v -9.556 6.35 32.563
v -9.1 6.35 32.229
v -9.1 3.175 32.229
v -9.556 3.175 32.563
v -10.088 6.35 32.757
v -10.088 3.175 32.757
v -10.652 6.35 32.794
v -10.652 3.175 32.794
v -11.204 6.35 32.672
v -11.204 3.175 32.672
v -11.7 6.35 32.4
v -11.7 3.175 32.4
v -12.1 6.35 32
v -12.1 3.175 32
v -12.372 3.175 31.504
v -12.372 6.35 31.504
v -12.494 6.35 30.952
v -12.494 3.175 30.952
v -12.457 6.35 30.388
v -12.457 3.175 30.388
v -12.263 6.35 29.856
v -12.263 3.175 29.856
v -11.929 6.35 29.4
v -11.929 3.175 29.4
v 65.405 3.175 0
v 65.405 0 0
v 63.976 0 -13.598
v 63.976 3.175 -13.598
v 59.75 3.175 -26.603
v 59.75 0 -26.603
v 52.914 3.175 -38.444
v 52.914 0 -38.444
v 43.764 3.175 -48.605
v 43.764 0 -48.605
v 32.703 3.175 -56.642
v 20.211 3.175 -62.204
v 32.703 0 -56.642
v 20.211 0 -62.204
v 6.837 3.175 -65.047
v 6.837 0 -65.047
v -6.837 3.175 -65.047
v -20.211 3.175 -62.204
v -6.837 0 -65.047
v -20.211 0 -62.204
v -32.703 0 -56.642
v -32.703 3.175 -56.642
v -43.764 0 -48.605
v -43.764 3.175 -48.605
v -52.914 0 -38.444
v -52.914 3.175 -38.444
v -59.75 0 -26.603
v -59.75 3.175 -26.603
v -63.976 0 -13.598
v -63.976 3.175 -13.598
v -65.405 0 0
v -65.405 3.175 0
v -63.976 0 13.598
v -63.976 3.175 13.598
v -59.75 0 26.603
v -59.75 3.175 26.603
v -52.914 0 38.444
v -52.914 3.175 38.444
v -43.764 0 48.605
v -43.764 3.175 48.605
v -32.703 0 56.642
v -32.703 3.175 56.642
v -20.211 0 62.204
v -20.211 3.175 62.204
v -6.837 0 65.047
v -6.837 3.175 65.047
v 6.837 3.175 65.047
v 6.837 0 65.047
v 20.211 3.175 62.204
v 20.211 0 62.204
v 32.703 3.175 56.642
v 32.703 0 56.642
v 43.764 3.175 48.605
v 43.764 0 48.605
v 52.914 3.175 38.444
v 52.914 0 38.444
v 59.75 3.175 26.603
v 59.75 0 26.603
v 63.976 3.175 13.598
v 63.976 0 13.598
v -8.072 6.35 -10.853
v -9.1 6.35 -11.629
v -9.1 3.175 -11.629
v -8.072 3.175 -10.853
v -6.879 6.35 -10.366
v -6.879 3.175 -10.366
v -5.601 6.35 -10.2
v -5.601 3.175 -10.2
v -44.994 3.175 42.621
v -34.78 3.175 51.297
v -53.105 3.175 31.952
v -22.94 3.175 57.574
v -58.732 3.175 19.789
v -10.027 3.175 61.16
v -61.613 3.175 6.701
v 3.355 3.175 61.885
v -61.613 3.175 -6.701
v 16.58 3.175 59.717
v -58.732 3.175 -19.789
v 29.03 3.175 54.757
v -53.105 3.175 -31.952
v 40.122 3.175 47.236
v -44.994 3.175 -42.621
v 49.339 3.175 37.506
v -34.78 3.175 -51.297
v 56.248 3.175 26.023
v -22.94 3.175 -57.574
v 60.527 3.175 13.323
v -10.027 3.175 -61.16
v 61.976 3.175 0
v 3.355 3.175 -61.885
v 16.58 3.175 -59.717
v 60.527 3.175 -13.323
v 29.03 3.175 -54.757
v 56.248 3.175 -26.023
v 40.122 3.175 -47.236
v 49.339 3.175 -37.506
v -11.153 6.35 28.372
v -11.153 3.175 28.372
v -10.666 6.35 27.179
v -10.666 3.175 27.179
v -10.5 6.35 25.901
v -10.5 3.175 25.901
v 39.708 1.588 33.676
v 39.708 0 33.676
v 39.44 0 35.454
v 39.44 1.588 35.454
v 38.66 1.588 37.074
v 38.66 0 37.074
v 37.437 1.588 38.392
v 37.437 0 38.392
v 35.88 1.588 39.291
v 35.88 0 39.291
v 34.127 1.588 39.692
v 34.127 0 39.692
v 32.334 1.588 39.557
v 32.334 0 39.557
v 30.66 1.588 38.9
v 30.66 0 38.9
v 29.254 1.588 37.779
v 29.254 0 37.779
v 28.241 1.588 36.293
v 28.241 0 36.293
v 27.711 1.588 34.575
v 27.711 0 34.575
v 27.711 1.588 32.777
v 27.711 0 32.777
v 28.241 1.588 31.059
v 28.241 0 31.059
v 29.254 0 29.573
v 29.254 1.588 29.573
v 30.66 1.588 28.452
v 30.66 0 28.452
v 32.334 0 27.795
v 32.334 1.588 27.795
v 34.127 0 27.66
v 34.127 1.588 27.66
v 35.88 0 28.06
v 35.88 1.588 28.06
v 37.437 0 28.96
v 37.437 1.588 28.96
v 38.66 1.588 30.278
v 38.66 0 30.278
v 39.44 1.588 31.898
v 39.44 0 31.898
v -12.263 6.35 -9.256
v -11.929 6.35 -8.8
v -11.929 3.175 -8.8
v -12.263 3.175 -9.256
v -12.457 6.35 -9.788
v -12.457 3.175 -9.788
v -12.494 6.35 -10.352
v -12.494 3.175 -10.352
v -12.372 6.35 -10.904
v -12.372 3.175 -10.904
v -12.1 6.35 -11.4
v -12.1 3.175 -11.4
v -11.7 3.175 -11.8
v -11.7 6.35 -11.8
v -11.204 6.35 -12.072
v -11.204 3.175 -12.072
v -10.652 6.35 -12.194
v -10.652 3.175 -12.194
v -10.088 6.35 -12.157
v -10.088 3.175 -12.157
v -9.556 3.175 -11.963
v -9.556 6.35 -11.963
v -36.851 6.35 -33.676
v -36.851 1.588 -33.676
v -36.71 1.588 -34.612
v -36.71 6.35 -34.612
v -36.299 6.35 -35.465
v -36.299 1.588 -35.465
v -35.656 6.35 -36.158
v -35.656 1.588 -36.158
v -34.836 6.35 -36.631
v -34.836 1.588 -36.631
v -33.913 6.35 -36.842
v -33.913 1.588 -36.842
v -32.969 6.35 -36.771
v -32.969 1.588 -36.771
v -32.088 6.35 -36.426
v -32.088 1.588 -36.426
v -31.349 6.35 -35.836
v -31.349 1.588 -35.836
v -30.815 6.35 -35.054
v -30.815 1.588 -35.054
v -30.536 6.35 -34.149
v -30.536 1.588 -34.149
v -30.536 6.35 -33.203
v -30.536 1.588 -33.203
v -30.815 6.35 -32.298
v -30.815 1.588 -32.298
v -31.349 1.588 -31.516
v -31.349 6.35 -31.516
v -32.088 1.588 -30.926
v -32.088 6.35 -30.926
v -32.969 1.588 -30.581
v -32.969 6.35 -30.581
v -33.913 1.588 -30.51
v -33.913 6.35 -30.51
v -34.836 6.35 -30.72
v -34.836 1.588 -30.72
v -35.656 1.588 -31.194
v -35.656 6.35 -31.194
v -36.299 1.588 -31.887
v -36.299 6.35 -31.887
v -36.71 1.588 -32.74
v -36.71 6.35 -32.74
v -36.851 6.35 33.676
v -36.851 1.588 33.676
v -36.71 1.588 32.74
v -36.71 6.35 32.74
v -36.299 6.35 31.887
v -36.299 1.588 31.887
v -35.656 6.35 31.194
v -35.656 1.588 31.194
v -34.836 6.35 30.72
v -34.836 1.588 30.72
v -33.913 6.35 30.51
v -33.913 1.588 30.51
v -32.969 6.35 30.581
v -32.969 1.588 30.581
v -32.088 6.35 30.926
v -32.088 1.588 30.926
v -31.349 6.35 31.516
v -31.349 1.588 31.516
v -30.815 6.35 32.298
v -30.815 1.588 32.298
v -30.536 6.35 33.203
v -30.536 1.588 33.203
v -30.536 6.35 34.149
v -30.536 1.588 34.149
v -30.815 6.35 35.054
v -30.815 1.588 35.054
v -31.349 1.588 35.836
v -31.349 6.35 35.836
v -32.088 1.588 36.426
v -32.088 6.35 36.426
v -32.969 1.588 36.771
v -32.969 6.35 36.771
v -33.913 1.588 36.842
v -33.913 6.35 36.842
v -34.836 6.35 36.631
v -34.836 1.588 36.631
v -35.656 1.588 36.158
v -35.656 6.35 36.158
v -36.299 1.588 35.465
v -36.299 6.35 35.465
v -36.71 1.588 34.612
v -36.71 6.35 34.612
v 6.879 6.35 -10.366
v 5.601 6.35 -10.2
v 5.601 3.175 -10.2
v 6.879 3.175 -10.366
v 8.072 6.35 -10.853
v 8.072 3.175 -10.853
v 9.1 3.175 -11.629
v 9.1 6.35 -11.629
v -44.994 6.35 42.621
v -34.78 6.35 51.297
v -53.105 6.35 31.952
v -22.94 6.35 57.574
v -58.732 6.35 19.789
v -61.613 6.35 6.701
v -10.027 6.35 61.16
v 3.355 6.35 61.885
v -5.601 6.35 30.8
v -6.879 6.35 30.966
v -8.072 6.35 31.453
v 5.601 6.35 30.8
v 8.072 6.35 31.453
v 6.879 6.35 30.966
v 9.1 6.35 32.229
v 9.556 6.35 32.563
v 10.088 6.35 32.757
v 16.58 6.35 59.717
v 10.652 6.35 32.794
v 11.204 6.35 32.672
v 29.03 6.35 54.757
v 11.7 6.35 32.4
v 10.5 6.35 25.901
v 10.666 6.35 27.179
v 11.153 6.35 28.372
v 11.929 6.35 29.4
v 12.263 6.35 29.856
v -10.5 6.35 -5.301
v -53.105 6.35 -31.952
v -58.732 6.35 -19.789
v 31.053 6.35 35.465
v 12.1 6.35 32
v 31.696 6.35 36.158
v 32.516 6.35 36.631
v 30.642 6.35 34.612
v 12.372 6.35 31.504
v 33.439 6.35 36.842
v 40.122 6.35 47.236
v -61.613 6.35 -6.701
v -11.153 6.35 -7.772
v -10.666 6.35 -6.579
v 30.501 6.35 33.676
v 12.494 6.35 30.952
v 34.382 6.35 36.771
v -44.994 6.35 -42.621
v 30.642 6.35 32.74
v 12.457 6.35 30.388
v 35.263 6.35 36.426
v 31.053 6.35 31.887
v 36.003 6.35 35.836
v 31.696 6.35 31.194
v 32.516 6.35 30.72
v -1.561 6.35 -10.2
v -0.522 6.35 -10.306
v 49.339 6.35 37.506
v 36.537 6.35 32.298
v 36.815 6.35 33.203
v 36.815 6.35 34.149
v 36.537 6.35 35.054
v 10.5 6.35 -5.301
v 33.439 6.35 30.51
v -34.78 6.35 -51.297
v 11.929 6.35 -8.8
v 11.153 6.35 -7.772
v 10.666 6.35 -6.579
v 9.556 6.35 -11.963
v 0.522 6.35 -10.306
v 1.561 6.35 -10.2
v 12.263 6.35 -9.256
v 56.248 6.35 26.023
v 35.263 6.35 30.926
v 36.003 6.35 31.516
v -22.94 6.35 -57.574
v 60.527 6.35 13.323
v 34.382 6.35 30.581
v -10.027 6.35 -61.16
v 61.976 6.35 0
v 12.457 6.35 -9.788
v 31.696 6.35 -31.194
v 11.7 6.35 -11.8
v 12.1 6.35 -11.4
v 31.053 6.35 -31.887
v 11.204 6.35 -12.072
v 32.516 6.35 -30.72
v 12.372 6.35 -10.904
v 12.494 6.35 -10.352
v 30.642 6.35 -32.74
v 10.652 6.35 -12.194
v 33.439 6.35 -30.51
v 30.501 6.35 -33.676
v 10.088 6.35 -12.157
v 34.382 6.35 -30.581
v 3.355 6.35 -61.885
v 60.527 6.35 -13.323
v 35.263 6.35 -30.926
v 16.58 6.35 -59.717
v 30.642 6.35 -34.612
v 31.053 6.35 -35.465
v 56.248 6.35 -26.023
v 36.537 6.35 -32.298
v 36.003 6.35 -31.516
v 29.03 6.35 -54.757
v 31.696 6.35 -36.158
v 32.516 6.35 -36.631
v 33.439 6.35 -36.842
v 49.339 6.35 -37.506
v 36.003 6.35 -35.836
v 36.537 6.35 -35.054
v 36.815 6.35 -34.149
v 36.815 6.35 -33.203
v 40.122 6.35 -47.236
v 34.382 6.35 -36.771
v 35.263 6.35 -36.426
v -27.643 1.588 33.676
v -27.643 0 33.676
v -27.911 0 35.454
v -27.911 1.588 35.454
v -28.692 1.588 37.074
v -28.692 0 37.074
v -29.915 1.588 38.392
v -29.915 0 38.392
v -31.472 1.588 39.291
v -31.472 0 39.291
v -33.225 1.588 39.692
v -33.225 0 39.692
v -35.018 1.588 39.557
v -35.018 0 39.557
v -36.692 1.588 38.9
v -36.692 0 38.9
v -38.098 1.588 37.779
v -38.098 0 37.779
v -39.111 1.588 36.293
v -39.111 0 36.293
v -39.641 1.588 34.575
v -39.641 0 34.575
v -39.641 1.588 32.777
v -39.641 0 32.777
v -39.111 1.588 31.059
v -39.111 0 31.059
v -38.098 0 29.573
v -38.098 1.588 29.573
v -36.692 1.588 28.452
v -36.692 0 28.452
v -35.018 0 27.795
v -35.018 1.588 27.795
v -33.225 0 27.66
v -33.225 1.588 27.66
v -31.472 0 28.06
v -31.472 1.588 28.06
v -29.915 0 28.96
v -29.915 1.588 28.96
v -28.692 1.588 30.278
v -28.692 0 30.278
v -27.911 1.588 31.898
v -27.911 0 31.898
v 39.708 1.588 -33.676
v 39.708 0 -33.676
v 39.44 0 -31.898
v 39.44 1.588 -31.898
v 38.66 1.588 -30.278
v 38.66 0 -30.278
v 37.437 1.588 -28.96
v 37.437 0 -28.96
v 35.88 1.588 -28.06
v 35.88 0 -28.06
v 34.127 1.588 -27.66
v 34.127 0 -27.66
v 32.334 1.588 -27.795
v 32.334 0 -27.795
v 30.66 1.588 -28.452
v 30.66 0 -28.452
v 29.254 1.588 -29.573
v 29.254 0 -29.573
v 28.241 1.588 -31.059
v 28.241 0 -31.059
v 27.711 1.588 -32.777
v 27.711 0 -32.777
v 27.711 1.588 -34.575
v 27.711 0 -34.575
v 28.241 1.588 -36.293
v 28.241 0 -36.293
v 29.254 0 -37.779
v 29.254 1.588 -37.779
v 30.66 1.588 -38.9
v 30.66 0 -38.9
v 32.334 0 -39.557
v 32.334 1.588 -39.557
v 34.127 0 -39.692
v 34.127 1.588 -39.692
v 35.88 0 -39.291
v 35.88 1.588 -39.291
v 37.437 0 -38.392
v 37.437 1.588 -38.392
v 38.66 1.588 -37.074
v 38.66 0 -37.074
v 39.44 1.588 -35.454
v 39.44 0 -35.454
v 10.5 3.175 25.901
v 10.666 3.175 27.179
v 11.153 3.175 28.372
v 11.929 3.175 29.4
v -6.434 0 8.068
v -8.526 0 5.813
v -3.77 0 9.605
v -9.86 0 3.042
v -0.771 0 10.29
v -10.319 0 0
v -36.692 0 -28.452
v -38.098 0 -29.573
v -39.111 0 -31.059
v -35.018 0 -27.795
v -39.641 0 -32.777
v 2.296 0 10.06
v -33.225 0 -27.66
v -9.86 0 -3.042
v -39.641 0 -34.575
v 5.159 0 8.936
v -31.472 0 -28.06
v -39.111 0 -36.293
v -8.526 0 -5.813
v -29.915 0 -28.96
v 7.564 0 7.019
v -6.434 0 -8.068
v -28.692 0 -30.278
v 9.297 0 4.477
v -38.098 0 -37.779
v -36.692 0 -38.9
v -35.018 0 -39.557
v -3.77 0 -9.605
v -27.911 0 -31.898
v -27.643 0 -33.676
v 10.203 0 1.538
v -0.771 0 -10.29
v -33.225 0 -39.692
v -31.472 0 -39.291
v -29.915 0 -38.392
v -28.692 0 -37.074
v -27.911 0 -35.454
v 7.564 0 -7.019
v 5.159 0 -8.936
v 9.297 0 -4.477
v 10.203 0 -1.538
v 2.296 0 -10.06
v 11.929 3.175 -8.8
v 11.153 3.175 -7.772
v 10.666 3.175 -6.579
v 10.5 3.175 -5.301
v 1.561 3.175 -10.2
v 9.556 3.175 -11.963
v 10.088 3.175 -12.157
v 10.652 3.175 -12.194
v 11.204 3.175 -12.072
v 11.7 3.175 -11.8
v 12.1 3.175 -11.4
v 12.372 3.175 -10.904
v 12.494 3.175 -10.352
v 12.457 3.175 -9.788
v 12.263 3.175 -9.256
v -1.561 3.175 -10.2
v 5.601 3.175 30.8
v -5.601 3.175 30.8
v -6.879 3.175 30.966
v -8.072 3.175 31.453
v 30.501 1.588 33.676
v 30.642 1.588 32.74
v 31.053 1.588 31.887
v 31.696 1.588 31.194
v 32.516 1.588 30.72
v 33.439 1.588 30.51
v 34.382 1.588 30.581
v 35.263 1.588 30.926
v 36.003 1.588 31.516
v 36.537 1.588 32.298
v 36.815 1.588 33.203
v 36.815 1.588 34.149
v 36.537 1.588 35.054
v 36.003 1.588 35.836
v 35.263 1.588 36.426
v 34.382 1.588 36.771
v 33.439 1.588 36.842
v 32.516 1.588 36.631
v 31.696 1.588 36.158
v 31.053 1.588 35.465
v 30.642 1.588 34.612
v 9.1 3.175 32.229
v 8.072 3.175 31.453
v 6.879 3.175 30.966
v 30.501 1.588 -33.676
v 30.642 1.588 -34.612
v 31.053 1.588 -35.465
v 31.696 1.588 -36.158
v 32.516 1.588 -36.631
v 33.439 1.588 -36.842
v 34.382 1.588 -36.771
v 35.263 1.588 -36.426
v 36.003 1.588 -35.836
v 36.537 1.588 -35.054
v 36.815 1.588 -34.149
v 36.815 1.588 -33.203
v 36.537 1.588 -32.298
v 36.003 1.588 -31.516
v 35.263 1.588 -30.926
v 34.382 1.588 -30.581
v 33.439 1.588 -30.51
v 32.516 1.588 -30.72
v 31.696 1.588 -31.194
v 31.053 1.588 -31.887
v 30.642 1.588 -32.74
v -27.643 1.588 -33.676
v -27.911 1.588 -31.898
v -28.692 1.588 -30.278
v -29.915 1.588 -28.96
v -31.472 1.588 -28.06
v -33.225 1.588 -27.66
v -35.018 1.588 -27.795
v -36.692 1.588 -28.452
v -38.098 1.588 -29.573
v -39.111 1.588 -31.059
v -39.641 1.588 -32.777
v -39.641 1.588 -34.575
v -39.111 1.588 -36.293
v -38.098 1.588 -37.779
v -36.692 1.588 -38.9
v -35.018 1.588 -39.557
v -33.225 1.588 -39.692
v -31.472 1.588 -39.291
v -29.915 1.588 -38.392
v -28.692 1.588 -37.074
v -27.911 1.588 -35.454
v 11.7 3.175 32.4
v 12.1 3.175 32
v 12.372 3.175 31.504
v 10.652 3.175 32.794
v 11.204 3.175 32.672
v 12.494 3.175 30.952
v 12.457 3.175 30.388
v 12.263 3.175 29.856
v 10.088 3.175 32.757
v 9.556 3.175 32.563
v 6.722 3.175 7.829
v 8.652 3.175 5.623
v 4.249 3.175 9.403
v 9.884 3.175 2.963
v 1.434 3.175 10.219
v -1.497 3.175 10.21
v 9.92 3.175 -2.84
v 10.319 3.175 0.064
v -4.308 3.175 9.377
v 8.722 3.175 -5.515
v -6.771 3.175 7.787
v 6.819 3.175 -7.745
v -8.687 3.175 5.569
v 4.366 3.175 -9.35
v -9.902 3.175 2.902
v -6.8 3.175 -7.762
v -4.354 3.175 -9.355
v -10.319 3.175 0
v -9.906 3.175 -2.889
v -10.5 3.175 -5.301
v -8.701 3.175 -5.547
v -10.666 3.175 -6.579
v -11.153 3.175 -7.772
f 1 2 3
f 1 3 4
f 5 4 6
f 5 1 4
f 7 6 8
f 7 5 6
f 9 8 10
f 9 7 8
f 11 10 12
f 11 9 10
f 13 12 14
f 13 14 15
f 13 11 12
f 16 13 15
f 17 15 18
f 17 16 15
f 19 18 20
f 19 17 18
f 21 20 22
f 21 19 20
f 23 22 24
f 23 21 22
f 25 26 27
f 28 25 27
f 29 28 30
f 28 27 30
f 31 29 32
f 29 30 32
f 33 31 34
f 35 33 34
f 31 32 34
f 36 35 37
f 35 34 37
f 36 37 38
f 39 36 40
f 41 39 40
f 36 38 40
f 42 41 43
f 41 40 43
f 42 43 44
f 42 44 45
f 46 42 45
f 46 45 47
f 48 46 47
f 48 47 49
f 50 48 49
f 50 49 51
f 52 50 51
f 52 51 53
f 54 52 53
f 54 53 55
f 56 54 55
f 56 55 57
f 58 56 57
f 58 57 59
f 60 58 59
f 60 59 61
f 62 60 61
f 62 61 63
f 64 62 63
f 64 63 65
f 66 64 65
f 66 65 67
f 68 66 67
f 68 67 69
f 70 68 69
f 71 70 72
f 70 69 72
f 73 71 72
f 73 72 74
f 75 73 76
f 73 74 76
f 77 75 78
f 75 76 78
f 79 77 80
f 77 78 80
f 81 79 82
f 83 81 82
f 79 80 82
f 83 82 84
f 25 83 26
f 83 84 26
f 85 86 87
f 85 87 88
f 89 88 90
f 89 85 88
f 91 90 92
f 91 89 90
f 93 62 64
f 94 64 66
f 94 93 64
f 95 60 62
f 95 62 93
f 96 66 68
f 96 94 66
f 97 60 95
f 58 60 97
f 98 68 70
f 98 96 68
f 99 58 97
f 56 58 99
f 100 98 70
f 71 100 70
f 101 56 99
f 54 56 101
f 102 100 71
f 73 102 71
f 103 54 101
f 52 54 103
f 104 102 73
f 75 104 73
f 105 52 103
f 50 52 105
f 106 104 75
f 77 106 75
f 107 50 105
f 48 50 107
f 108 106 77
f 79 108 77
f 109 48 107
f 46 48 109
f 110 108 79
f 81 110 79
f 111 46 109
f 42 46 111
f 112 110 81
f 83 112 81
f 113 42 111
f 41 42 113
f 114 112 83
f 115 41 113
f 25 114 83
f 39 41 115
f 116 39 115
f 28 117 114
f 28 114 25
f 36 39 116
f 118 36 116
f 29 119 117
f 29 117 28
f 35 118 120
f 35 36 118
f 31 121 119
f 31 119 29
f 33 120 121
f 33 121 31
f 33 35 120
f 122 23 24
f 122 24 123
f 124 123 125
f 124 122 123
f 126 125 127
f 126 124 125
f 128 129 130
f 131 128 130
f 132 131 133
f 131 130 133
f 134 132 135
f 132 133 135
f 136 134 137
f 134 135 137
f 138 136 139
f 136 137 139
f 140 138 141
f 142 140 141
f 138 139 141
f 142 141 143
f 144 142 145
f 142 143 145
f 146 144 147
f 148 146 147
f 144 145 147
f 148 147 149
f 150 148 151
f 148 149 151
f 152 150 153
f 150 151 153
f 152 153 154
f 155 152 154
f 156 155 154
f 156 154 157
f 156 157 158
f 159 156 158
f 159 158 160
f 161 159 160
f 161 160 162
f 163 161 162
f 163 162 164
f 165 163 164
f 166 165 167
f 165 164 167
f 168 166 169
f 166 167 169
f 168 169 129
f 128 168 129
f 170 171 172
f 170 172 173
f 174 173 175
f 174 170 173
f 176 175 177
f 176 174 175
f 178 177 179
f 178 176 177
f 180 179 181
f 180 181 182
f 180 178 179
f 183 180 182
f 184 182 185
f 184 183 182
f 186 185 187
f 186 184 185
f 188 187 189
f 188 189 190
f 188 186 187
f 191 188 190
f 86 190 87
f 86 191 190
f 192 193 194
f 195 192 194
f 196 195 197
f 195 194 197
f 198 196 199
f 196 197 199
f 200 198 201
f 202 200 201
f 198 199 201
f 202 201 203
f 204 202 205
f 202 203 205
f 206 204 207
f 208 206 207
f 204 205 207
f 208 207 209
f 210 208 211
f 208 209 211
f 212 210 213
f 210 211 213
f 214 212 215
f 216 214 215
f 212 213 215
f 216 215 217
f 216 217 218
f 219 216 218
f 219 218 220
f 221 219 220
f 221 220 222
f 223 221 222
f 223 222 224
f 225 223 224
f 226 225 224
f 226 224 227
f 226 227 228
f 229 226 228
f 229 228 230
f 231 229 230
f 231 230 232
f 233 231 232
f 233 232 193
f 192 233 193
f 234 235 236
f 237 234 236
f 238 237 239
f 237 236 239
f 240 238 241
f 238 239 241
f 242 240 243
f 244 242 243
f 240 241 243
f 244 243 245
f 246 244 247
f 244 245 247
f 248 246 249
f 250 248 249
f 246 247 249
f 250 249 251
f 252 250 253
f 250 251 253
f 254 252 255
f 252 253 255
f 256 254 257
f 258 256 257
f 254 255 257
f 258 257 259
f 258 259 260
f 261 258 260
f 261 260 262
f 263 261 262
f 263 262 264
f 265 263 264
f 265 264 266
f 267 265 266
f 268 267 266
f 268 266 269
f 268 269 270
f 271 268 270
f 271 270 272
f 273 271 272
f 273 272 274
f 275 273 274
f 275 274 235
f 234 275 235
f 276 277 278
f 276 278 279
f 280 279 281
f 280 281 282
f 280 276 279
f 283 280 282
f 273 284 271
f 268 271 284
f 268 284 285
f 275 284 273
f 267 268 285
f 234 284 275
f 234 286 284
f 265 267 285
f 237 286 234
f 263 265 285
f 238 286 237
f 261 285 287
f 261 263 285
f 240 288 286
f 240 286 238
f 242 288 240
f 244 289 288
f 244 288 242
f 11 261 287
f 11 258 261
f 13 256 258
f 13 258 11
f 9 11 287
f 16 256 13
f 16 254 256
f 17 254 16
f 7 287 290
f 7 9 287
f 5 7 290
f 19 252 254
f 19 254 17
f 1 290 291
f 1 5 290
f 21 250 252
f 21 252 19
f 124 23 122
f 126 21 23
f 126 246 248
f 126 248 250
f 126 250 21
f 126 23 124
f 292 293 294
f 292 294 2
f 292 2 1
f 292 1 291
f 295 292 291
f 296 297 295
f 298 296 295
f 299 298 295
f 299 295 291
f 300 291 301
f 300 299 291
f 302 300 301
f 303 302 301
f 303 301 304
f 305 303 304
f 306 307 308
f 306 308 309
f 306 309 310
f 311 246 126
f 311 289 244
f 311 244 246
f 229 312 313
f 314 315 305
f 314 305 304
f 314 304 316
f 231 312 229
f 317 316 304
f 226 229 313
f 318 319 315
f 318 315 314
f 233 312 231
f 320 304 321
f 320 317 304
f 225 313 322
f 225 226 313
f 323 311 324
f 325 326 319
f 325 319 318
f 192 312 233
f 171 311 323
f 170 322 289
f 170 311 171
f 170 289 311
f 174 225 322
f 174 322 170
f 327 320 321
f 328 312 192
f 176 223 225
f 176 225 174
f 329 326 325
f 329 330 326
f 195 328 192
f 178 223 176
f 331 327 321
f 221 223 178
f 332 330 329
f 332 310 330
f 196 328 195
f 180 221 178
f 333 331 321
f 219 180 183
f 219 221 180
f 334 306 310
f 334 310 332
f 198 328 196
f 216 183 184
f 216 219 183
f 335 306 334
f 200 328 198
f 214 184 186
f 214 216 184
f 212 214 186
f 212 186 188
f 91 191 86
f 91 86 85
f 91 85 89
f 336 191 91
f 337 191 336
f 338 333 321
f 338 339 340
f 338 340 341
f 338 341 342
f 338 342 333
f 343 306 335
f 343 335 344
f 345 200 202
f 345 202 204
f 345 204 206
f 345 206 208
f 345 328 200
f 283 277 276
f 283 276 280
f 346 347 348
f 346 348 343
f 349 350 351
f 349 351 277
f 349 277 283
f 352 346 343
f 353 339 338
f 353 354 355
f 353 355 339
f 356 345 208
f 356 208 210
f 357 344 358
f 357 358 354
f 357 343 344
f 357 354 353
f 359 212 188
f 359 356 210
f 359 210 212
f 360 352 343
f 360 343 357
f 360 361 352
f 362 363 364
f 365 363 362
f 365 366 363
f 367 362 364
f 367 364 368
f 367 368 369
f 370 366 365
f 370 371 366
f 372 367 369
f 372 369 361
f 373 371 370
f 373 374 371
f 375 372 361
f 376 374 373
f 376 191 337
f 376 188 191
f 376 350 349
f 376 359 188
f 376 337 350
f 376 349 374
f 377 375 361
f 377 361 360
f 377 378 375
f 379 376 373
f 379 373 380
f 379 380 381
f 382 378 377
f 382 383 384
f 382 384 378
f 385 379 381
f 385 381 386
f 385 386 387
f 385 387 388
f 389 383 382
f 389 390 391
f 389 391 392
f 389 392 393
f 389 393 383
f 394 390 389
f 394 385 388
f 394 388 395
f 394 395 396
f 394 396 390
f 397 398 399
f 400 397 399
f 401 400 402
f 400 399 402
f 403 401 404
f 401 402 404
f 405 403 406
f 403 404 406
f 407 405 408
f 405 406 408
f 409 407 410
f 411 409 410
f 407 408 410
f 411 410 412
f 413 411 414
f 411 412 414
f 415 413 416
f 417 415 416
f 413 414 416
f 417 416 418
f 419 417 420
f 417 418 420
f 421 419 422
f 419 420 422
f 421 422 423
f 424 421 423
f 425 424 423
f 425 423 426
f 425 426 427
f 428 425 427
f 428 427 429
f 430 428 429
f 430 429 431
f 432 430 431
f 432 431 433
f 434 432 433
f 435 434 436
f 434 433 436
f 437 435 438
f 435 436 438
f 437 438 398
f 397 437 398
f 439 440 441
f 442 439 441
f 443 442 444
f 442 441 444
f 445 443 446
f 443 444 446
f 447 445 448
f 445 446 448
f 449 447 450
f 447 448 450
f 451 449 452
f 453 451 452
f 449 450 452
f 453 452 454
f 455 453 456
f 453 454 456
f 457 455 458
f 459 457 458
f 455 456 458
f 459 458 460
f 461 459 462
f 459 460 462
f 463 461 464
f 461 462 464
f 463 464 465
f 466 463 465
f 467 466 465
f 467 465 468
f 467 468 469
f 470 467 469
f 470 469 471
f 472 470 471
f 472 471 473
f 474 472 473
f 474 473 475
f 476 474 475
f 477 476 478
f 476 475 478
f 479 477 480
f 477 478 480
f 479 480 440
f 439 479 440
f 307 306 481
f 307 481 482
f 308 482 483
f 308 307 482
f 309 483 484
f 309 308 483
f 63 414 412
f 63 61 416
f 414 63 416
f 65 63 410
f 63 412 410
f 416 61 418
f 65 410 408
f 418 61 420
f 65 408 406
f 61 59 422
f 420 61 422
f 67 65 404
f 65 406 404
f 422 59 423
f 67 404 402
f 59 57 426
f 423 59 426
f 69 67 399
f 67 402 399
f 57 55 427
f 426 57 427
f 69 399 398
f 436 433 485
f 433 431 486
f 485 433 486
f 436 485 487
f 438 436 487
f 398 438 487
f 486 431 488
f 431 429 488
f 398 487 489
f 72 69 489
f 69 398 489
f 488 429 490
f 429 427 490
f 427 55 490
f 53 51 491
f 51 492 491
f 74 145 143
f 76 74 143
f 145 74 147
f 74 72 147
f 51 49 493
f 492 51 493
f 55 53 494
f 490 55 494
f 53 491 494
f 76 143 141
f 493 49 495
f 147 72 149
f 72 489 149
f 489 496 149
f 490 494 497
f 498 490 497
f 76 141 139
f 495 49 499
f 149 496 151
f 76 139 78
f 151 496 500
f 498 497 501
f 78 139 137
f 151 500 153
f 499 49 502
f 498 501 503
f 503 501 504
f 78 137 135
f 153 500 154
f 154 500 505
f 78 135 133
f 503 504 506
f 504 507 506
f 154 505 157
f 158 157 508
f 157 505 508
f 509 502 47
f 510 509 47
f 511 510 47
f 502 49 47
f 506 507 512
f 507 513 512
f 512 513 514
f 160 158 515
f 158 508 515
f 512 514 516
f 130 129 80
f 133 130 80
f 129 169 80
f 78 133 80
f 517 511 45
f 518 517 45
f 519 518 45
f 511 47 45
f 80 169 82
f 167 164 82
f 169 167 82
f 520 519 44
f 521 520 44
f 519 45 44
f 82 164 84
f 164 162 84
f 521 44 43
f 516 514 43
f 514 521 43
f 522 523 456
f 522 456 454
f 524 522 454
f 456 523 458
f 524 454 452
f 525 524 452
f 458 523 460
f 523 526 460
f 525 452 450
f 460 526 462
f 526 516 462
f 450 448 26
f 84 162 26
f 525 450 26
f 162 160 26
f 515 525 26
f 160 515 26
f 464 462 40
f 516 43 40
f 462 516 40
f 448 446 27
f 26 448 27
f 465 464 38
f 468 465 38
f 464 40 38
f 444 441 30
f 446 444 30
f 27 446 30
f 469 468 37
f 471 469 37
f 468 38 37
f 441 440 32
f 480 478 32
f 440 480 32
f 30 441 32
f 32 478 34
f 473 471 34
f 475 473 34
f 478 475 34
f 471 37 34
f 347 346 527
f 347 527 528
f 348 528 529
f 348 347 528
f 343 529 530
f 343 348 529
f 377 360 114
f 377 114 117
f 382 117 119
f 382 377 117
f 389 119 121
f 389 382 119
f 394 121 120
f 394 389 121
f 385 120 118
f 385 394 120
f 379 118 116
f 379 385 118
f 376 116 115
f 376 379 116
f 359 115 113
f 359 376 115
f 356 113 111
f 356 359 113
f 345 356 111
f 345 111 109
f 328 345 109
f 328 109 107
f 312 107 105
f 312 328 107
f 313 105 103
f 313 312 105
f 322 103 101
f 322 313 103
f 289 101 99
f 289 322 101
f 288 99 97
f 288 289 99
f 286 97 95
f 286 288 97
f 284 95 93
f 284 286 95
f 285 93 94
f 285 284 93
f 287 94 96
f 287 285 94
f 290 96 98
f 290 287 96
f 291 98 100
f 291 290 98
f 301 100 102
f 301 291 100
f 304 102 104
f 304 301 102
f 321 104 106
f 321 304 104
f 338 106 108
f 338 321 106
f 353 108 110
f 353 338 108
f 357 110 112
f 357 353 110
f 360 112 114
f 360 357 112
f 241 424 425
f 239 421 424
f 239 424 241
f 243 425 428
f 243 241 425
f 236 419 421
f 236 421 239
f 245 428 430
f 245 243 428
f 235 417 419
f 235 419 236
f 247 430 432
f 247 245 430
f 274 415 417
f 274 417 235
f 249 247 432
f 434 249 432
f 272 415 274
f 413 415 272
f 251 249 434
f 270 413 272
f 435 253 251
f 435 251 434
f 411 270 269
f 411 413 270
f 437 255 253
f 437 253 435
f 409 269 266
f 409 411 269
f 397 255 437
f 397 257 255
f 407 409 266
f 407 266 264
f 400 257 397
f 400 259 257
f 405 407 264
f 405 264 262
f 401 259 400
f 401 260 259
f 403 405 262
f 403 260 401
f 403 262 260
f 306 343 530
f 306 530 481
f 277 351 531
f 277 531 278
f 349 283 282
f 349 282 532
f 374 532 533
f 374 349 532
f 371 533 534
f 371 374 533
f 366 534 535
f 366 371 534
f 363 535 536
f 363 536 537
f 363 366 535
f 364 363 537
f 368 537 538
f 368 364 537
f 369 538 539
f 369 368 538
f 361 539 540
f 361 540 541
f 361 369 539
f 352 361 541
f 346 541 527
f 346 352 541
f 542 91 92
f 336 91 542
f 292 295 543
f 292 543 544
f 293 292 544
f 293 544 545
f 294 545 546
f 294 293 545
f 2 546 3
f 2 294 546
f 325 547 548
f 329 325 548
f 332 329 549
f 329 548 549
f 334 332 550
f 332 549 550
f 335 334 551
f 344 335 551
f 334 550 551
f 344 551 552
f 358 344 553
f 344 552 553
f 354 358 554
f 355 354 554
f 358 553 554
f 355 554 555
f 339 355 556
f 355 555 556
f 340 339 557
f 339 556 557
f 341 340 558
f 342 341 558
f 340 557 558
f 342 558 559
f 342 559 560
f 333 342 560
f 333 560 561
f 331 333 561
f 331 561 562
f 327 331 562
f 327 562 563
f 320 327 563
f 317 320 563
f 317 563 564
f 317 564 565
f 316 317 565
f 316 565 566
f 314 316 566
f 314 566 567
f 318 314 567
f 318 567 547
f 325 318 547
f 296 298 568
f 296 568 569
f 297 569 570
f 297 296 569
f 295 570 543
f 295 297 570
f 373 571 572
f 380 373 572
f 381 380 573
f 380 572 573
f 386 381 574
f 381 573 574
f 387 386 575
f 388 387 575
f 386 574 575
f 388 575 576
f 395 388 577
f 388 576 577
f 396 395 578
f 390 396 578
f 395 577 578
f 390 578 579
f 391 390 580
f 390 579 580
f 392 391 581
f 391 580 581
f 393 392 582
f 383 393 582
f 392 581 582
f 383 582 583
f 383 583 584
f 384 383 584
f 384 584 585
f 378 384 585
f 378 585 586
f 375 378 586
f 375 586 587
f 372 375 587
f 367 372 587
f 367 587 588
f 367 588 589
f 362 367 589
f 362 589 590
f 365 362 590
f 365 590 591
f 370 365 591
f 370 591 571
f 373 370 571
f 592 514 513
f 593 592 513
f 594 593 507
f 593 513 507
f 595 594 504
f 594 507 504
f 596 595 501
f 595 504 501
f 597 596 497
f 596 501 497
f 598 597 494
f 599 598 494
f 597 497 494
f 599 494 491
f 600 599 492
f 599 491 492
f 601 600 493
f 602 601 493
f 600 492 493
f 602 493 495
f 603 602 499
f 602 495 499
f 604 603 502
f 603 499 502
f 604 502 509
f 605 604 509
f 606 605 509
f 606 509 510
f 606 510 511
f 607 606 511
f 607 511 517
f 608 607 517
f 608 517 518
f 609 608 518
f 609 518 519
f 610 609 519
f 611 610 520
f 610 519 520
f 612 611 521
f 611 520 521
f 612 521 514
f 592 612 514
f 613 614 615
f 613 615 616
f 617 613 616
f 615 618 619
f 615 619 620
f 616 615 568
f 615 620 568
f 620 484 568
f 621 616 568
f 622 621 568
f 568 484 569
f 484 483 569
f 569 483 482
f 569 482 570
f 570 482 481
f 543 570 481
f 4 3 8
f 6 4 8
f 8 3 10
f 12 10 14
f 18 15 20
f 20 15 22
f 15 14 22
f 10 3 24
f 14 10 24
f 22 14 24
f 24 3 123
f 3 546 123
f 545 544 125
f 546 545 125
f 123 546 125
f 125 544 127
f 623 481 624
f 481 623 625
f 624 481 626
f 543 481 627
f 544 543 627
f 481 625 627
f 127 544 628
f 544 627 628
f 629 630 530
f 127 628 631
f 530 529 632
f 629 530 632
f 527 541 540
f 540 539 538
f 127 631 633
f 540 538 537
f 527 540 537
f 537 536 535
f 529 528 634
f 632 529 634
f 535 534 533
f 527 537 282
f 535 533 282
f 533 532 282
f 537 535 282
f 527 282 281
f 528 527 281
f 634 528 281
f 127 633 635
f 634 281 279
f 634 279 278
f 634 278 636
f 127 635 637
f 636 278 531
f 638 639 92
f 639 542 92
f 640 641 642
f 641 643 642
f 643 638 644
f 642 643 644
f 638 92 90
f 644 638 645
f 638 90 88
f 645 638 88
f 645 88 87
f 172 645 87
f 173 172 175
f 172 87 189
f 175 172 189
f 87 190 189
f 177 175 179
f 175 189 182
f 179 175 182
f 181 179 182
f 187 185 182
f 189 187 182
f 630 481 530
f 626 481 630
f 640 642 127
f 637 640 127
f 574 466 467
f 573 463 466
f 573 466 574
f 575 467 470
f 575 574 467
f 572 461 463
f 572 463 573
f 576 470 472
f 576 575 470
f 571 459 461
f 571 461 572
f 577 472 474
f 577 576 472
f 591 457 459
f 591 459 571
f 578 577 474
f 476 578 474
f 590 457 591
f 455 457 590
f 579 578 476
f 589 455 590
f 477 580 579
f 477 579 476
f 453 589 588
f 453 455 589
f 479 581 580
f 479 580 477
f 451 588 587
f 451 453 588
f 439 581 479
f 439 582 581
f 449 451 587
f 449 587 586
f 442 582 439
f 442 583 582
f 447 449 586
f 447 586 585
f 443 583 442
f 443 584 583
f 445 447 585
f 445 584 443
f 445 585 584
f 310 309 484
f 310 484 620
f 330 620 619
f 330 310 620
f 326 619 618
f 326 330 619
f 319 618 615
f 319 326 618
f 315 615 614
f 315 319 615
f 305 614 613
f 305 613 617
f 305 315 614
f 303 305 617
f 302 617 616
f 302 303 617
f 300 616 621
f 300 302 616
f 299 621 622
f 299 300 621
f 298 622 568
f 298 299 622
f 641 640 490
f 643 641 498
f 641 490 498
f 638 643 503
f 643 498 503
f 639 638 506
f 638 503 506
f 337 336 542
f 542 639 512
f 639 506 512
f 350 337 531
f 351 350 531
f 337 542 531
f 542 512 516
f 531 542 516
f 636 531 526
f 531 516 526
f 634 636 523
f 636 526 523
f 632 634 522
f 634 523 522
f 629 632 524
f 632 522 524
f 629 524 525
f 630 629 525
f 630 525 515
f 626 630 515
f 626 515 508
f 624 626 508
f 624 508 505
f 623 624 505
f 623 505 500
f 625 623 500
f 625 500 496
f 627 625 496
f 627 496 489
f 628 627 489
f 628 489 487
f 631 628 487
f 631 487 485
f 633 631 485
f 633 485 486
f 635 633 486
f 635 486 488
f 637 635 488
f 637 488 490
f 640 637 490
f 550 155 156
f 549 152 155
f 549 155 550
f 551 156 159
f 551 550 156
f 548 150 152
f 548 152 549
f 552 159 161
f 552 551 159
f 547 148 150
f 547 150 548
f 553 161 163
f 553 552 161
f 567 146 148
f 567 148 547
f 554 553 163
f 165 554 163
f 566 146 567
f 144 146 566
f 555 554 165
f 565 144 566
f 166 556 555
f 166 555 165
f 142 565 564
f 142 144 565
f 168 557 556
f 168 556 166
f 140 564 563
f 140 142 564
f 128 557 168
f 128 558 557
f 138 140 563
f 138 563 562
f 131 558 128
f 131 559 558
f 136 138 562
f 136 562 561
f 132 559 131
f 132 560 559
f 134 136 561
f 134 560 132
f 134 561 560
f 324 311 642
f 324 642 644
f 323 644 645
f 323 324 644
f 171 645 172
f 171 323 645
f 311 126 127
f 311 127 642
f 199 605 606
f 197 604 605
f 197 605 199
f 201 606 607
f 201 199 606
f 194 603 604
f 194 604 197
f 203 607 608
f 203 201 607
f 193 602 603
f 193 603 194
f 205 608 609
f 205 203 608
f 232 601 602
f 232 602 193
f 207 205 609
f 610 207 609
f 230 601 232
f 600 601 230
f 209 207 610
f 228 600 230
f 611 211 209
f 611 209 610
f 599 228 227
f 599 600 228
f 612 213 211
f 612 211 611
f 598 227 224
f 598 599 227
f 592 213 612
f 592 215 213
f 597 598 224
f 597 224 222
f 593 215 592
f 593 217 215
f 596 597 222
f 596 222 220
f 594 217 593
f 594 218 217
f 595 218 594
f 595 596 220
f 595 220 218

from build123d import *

# Parameters (mm, degrees)
SKETCH2_R                       = 65.405
BOSS_EXTRUDE1_DEPTH             = 6.35
SKETCH4_R                       = 65.405
SKETCH4_R_2                     = 61.976
CUT_EXTRUDE1_DEPTH              = 3.175
F_1_4_0_25_DIAMETER_HOLE1_D     = 6.35
F_13_16_0_8125_DIAMETER_HOLE1_D = 20.6375
CUT_EXTRUDE3_DEPTH              = 3.175
SKETCH9_R                       = 6.0325
CUT_EXTRUDE2_DEPTH              = 1.5875


with BuildPart() as part:
    # Sketch2 → Boss-Extrude1 (new body)
    with BuildSketch(Plane(origin=(0, 0, 0), x_dir=(1, 0, 0), z_dir=(0, 1, 0))):
        Circle(SKETCH2_R)
    extrude(amount=BOSS_EXTRUDE1_DEPTH)

    # Sketch4 → Cut-Extrude1 (cut)
    with BuildSketch(Plane(origin=(0, 6.35, 0), x_dir=(1, 0, 0), z_dir=(0, 1, 0))):
        Circle(SKETCH4_R)
        Circle(SKETCH4_R_2, mode=Mode.SUBTRACT)
    extrude(amount=-CUT_EXTRUDE1_DEPTH, mode=Mode.SUBTRACT)

    # 1/4 (0.25) Diameter Hole1 (through all)
    with Locations(Plane(origin=(0, 6.35, 0), x_dir=(1, 0, 0), z_dir=(0, 1, 0))):
        with Locations((-33.675960454, 33.675960454), (-33.675960454, -33.675960454), (33.675960454, 33.675960454), (33.675960454, -33.675960454)):
            Hole(F_1_4_0_25_DIAMETER_HOLE1_D / 2)

    # 13/16 (0.8125) Diameter Hole1 (through all)
    with Locations(Plane(origin=(0, 6.35, 0), x_dir=(1, 0, 0), z_dir=(0, 1, 0))):
        with Locations((0, 0)):
            Hole(F_13_16_0_8125_DIAMETER_HOLE1_D / 2)

    # Sketch11 → Cut-Extrude3 (cut)
    with BuildSketch(Plane(origin=(0, 6.35, 0), x_dir=(1, 0, 0), z_dir=(0, 1, 0))):
        with BuildLine():
            Line((-5.601020514, 10.2), (5.601020514, 10.2))
            ThreePointArc((5.601020514, 10.2), (7.490842879, 10.570899501), (9.100291576, 11.628571429))
            ThreePointArc((9.100291576, 11.628571429), (11.914213562, 11.614213562), (11.928571429, 8.800291576))
            ThreePointArc((11.928571429, 8.800291576), (10.870899501, 7.190842879), (10.5, 5.301020514))
            Line((10.5, 5.301020514), (10.5, -25.901020514))
            ThreePointArc((10.5, -25.901020514), (10.870899501, -27.790842879), (11.928571429, -29.400291576))
            ThreePointArc((11.928571429, -29.400291576), (11.914213562, -32.214213562), (9.100291576, -32.228571429))
            ThreePointArc((9.100291576, -32.228571429), (7.490842879, -31.170899501), (5.601020514, -30.8))
            Line((5.601020514, -30.8), (-5.601020514, -30.8))
            ThreePointArc((-5.601020514, -30.8), (-7.490842879, -31.170899501), (-9.100291576, -32.228571429))
            ThreePointArc((-9.100291576, -32.228571429), (-11.914213562, -32.214213562), (-11.928571429, -29.400291576))
            ThreePointArc((-11.928571429, -29.400291576), (-10.870899501, -27.790842879), (-10.5, -25.901020514))
            Line((-10.5, -25.901020514), (-10.5, 5.301020514))
            ThreePointArc((-10.5, 5.301020514), (-10.870899501, 7.190842879), (-11.928571429, 8.800291576))
            ThreePointArc((-11.928571429, 8.800291576), (-11.914213562, 11.614213562), (-9.100291576, 11.628571429))
            ThreePointArc((-9.100291576, 11.628571429), (-7.490842879, 10.570899501), (-5.601020514, 10.2))
        make_face()
    extrude(amount=-CUT_EXTRUDE3_DEPTH, mode=Mode.SUBTRACT)

    # Sketch9 → Cut-Extrude2 (cut)
    with BuildSketch(Plane.XZ):
        with Locations((-33.675960454, 33.675960454)):
            Circle(SKETCH9_R)
        with Locations((33.675960454, 33.675960454)):
            Circle(SKETCH9_R)
        with Locations((33.675960454, -33.675960454)):
            Circle(SKETCH9_R)
        with Locations((-33.675960454, -33.675960454)):
            Circle(SKETCH9_R)
    extrude(amount=-CUT_EXTRUDE2_DEPTH, mode=Mode.SUBTRACT)


solid = part.part
